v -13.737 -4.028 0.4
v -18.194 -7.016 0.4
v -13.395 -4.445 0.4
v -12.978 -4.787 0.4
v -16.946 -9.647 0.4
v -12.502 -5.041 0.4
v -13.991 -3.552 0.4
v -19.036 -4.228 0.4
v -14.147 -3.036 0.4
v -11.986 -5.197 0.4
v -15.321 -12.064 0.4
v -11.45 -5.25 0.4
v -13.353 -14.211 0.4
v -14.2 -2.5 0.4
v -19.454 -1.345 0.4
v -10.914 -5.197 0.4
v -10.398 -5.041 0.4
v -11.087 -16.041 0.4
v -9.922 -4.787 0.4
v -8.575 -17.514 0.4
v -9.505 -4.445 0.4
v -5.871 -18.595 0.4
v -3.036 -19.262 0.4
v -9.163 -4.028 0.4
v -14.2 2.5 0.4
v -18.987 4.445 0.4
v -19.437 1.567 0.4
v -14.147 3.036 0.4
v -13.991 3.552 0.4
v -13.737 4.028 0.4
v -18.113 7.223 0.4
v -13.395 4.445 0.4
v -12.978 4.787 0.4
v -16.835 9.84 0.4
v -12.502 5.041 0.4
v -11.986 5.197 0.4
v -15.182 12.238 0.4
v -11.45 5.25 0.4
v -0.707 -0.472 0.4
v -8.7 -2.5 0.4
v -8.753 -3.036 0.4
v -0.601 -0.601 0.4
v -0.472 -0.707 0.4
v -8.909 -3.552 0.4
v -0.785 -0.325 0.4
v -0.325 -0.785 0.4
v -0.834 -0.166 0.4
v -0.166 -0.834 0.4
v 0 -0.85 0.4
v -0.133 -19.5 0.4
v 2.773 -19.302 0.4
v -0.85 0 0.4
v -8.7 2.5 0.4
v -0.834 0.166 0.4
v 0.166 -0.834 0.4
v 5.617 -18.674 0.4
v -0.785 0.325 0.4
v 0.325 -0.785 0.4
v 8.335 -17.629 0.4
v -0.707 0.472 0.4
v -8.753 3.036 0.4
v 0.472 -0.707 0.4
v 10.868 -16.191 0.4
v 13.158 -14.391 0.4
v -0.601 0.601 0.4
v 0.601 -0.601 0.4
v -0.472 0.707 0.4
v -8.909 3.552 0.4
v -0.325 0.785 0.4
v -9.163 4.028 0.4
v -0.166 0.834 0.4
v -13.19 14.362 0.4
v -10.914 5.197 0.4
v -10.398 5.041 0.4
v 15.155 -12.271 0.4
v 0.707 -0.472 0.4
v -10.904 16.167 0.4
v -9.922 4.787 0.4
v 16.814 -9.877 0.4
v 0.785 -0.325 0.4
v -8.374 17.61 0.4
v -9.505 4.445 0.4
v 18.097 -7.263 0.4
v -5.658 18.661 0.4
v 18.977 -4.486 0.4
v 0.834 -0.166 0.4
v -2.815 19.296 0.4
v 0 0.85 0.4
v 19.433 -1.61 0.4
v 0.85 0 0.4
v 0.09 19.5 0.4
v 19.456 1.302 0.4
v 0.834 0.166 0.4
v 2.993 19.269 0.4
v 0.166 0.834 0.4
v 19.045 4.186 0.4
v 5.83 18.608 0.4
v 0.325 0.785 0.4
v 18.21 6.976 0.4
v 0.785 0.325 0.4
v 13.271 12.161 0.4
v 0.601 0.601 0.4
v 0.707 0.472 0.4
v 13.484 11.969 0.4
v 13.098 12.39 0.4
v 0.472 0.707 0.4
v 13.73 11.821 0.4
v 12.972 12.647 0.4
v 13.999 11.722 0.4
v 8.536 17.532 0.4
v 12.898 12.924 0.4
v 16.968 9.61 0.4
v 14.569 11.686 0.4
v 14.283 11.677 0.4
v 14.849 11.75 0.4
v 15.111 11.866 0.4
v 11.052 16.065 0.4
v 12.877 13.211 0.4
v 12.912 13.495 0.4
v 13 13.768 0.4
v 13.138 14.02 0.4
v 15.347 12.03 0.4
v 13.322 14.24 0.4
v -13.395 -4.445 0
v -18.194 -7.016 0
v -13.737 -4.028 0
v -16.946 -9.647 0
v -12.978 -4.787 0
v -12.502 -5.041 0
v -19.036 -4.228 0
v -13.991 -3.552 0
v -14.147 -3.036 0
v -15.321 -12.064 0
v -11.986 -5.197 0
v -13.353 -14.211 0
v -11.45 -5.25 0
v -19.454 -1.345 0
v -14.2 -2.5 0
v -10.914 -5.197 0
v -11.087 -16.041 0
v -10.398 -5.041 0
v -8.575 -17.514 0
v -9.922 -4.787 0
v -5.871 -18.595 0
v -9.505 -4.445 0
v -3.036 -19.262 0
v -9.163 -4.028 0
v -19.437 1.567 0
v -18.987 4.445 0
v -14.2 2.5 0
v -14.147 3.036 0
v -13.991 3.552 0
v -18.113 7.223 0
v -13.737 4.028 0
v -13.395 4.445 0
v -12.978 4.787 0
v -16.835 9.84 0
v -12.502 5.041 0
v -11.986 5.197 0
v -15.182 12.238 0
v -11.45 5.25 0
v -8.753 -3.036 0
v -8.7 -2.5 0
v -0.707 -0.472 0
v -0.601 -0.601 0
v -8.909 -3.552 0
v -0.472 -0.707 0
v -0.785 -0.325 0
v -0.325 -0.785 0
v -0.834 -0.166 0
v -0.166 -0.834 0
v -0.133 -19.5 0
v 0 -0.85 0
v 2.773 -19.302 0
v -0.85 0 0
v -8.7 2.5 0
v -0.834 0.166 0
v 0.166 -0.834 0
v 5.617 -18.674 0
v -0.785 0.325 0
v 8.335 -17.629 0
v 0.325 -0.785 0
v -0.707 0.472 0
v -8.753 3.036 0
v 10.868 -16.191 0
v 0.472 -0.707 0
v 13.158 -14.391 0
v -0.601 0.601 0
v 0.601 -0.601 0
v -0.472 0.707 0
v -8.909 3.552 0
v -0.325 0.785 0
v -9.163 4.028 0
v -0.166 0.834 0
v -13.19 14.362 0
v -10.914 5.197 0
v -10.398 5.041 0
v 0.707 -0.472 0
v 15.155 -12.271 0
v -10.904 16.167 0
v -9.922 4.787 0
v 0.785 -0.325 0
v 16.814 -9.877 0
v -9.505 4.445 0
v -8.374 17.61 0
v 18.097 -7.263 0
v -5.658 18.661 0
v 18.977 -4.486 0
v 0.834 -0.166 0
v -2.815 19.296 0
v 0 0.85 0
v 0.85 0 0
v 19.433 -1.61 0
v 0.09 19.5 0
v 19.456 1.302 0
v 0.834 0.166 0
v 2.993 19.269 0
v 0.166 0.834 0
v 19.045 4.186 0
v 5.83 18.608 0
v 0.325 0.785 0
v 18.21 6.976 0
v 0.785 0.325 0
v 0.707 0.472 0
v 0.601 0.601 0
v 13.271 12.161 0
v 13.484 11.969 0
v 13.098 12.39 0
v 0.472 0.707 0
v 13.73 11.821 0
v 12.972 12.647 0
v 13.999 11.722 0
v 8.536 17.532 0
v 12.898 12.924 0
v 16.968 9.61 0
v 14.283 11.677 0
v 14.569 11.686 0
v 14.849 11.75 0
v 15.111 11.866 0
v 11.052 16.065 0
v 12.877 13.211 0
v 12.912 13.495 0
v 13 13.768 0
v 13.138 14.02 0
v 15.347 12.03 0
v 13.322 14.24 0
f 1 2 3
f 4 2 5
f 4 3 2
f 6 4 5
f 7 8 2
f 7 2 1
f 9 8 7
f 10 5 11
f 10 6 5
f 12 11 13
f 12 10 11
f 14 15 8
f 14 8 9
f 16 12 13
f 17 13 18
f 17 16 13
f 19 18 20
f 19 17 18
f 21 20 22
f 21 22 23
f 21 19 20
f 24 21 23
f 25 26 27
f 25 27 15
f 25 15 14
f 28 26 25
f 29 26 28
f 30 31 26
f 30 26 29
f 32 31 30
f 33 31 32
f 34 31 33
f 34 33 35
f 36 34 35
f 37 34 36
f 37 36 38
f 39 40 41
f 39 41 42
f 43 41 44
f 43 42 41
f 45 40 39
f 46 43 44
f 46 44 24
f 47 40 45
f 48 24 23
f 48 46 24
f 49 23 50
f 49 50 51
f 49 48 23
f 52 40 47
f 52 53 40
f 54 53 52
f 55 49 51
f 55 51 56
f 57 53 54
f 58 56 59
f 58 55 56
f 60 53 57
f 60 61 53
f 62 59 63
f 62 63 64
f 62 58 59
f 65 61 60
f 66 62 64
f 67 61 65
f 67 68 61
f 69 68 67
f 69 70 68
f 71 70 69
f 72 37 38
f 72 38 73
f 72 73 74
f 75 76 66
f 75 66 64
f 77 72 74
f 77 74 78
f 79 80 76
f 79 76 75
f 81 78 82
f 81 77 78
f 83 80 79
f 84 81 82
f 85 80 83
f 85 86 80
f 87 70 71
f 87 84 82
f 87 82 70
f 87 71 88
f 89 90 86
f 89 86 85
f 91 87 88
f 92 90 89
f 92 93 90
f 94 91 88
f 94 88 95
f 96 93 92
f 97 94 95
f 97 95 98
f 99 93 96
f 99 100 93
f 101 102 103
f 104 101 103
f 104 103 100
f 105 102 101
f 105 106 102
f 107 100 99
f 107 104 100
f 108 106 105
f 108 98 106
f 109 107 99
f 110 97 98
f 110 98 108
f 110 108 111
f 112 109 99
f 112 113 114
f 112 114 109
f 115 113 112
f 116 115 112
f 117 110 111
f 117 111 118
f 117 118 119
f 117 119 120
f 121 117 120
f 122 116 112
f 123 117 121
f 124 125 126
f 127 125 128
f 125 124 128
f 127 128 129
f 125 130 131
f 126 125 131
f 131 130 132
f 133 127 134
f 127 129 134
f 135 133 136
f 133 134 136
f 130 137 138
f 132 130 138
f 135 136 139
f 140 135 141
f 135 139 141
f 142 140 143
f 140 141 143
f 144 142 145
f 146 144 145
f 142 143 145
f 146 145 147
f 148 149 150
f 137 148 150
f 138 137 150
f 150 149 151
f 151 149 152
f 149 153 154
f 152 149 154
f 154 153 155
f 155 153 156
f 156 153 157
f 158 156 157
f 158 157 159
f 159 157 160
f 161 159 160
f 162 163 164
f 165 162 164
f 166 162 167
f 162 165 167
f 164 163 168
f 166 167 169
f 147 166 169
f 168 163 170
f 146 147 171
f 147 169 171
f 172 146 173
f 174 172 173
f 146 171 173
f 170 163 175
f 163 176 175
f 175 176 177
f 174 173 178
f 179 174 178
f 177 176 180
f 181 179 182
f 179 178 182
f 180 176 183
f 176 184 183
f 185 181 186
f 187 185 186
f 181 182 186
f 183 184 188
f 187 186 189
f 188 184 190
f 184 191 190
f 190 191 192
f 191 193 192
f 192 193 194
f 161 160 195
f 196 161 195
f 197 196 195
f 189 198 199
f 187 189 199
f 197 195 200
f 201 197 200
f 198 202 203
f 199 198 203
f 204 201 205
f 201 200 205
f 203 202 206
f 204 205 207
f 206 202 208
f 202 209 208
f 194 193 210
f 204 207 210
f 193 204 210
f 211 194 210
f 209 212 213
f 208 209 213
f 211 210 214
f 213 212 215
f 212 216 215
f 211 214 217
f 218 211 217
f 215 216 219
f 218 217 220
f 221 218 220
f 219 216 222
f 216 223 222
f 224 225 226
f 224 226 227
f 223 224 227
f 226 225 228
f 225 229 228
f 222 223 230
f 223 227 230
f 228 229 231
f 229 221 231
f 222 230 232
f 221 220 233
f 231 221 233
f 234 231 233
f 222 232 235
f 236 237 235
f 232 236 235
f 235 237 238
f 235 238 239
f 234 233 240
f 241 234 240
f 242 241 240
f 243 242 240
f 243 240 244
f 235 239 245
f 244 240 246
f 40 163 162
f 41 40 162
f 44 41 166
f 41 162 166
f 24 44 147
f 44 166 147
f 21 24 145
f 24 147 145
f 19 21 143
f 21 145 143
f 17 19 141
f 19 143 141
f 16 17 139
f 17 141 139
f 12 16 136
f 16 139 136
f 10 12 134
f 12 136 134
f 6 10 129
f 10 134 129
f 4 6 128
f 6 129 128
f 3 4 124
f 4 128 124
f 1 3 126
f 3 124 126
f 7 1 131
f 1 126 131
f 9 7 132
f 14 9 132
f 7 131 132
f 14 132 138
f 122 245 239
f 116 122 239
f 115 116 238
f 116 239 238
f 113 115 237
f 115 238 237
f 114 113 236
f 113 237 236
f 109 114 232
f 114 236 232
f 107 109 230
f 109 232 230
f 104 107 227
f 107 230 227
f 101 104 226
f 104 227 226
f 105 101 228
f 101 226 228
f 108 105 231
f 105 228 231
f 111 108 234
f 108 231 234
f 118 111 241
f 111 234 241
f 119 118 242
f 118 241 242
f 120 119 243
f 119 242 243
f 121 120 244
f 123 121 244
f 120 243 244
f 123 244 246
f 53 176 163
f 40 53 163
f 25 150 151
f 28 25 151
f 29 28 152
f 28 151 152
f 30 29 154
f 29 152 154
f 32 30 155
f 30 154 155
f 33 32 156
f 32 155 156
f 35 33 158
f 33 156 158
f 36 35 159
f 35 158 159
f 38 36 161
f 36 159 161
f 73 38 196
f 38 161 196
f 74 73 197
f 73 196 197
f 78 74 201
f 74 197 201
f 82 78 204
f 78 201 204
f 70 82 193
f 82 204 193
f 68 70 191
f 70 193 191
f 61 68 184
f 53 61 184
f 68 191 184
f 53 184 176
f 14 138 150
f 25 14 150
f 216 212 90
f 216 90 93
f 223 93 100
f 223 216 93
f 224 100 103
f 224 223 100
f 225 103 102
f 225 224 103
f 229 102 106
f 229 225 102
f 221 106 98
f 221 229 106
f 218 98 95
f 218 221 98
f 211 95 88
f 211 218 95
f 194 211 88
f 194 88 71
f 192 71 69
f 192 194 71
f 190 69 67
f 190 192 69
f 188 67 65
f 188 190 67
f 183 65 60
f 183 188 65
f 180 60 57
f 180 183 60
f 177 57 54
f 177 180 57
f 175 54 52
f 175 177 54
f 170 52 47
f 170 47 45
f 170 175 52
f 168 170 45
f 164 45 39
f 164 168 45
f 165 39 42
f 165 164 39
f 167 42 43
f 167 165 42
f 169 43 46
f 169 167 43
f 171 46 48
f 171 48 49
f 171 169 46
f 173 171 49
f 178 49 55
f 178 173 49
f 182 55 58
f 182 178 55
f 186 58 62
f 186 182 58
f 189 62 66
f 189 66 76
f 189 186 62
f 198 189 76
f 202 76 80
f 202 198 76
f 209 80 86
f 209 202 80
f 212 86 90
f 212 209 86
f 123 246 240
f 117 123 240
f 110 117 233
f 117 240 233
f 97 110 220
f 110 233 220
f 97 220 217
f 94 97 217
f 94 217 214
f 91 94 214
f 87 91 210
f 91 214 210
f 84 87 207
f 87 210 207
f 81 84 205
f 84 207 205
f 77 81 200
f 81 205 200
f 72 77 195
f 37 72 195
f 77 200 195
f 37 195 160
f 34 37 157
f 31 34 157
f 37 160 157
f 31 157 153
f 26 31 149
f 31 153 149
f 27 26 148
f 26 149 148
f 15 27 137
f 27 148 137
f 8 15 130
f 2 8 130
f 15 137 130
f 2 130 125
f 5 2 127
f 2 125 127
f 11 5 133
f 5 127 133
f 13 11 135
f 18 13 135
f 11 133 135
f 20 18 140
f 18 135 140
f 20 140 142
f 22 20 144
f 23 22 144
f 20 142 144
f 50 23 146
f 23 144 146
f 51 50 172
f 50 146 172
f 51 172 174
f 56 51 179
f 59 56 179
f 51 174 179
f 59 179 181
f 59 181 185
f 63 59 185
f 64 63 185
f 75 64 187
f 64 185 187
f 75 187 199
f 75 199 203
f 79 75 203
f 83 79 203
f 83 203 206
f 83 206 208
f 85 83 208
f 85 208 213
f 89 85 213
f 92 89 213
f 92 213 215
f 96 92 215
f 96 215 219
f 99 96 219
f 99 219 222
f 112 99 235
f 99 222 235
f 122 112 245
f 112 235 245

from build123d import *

# Parameters (mm, degrees)
ESQUISSE1_R        = 0.85
BOSS_EXTRU_1_DEPTH = 0.4


with BuildPart() as part:
    # Esquisse1 → Boss.-Extru.1 (new body)
    with BuildSketch(Plane.XY):
        with BuildLine():
            ThreePointArc((13.321737348, 14.240130408), (-14.376908068, -13.174009049), (15.347008325, 12.029934973))
            ThreePointArc((15.347008325, 12.029934973), (13.270992063, 12.160623737), (13.321737348, 14.240130408))
        make_face()
        Circle(ESQUISSE1_R, mode=Mode.SUBTRACT)
        with BuildLine():
            Line((-14.2, -2.5), (-14.2, 2.5))
            ThreePointArc((-14.2, 2.5), (-11.45, 5.25), (-8.7, 2.5))
            Line((-8.7, 2.5), (-8.7, -2.5))
            ThreePointArc((-8.7, -2.5), (-11.45, -5.25), (-14.2, -2.5))
        make_face(mode=Mode.SUBTRACT)
    extrude(amount=BOSS_EXTRU_1_DEPTH)


solid = part.part
